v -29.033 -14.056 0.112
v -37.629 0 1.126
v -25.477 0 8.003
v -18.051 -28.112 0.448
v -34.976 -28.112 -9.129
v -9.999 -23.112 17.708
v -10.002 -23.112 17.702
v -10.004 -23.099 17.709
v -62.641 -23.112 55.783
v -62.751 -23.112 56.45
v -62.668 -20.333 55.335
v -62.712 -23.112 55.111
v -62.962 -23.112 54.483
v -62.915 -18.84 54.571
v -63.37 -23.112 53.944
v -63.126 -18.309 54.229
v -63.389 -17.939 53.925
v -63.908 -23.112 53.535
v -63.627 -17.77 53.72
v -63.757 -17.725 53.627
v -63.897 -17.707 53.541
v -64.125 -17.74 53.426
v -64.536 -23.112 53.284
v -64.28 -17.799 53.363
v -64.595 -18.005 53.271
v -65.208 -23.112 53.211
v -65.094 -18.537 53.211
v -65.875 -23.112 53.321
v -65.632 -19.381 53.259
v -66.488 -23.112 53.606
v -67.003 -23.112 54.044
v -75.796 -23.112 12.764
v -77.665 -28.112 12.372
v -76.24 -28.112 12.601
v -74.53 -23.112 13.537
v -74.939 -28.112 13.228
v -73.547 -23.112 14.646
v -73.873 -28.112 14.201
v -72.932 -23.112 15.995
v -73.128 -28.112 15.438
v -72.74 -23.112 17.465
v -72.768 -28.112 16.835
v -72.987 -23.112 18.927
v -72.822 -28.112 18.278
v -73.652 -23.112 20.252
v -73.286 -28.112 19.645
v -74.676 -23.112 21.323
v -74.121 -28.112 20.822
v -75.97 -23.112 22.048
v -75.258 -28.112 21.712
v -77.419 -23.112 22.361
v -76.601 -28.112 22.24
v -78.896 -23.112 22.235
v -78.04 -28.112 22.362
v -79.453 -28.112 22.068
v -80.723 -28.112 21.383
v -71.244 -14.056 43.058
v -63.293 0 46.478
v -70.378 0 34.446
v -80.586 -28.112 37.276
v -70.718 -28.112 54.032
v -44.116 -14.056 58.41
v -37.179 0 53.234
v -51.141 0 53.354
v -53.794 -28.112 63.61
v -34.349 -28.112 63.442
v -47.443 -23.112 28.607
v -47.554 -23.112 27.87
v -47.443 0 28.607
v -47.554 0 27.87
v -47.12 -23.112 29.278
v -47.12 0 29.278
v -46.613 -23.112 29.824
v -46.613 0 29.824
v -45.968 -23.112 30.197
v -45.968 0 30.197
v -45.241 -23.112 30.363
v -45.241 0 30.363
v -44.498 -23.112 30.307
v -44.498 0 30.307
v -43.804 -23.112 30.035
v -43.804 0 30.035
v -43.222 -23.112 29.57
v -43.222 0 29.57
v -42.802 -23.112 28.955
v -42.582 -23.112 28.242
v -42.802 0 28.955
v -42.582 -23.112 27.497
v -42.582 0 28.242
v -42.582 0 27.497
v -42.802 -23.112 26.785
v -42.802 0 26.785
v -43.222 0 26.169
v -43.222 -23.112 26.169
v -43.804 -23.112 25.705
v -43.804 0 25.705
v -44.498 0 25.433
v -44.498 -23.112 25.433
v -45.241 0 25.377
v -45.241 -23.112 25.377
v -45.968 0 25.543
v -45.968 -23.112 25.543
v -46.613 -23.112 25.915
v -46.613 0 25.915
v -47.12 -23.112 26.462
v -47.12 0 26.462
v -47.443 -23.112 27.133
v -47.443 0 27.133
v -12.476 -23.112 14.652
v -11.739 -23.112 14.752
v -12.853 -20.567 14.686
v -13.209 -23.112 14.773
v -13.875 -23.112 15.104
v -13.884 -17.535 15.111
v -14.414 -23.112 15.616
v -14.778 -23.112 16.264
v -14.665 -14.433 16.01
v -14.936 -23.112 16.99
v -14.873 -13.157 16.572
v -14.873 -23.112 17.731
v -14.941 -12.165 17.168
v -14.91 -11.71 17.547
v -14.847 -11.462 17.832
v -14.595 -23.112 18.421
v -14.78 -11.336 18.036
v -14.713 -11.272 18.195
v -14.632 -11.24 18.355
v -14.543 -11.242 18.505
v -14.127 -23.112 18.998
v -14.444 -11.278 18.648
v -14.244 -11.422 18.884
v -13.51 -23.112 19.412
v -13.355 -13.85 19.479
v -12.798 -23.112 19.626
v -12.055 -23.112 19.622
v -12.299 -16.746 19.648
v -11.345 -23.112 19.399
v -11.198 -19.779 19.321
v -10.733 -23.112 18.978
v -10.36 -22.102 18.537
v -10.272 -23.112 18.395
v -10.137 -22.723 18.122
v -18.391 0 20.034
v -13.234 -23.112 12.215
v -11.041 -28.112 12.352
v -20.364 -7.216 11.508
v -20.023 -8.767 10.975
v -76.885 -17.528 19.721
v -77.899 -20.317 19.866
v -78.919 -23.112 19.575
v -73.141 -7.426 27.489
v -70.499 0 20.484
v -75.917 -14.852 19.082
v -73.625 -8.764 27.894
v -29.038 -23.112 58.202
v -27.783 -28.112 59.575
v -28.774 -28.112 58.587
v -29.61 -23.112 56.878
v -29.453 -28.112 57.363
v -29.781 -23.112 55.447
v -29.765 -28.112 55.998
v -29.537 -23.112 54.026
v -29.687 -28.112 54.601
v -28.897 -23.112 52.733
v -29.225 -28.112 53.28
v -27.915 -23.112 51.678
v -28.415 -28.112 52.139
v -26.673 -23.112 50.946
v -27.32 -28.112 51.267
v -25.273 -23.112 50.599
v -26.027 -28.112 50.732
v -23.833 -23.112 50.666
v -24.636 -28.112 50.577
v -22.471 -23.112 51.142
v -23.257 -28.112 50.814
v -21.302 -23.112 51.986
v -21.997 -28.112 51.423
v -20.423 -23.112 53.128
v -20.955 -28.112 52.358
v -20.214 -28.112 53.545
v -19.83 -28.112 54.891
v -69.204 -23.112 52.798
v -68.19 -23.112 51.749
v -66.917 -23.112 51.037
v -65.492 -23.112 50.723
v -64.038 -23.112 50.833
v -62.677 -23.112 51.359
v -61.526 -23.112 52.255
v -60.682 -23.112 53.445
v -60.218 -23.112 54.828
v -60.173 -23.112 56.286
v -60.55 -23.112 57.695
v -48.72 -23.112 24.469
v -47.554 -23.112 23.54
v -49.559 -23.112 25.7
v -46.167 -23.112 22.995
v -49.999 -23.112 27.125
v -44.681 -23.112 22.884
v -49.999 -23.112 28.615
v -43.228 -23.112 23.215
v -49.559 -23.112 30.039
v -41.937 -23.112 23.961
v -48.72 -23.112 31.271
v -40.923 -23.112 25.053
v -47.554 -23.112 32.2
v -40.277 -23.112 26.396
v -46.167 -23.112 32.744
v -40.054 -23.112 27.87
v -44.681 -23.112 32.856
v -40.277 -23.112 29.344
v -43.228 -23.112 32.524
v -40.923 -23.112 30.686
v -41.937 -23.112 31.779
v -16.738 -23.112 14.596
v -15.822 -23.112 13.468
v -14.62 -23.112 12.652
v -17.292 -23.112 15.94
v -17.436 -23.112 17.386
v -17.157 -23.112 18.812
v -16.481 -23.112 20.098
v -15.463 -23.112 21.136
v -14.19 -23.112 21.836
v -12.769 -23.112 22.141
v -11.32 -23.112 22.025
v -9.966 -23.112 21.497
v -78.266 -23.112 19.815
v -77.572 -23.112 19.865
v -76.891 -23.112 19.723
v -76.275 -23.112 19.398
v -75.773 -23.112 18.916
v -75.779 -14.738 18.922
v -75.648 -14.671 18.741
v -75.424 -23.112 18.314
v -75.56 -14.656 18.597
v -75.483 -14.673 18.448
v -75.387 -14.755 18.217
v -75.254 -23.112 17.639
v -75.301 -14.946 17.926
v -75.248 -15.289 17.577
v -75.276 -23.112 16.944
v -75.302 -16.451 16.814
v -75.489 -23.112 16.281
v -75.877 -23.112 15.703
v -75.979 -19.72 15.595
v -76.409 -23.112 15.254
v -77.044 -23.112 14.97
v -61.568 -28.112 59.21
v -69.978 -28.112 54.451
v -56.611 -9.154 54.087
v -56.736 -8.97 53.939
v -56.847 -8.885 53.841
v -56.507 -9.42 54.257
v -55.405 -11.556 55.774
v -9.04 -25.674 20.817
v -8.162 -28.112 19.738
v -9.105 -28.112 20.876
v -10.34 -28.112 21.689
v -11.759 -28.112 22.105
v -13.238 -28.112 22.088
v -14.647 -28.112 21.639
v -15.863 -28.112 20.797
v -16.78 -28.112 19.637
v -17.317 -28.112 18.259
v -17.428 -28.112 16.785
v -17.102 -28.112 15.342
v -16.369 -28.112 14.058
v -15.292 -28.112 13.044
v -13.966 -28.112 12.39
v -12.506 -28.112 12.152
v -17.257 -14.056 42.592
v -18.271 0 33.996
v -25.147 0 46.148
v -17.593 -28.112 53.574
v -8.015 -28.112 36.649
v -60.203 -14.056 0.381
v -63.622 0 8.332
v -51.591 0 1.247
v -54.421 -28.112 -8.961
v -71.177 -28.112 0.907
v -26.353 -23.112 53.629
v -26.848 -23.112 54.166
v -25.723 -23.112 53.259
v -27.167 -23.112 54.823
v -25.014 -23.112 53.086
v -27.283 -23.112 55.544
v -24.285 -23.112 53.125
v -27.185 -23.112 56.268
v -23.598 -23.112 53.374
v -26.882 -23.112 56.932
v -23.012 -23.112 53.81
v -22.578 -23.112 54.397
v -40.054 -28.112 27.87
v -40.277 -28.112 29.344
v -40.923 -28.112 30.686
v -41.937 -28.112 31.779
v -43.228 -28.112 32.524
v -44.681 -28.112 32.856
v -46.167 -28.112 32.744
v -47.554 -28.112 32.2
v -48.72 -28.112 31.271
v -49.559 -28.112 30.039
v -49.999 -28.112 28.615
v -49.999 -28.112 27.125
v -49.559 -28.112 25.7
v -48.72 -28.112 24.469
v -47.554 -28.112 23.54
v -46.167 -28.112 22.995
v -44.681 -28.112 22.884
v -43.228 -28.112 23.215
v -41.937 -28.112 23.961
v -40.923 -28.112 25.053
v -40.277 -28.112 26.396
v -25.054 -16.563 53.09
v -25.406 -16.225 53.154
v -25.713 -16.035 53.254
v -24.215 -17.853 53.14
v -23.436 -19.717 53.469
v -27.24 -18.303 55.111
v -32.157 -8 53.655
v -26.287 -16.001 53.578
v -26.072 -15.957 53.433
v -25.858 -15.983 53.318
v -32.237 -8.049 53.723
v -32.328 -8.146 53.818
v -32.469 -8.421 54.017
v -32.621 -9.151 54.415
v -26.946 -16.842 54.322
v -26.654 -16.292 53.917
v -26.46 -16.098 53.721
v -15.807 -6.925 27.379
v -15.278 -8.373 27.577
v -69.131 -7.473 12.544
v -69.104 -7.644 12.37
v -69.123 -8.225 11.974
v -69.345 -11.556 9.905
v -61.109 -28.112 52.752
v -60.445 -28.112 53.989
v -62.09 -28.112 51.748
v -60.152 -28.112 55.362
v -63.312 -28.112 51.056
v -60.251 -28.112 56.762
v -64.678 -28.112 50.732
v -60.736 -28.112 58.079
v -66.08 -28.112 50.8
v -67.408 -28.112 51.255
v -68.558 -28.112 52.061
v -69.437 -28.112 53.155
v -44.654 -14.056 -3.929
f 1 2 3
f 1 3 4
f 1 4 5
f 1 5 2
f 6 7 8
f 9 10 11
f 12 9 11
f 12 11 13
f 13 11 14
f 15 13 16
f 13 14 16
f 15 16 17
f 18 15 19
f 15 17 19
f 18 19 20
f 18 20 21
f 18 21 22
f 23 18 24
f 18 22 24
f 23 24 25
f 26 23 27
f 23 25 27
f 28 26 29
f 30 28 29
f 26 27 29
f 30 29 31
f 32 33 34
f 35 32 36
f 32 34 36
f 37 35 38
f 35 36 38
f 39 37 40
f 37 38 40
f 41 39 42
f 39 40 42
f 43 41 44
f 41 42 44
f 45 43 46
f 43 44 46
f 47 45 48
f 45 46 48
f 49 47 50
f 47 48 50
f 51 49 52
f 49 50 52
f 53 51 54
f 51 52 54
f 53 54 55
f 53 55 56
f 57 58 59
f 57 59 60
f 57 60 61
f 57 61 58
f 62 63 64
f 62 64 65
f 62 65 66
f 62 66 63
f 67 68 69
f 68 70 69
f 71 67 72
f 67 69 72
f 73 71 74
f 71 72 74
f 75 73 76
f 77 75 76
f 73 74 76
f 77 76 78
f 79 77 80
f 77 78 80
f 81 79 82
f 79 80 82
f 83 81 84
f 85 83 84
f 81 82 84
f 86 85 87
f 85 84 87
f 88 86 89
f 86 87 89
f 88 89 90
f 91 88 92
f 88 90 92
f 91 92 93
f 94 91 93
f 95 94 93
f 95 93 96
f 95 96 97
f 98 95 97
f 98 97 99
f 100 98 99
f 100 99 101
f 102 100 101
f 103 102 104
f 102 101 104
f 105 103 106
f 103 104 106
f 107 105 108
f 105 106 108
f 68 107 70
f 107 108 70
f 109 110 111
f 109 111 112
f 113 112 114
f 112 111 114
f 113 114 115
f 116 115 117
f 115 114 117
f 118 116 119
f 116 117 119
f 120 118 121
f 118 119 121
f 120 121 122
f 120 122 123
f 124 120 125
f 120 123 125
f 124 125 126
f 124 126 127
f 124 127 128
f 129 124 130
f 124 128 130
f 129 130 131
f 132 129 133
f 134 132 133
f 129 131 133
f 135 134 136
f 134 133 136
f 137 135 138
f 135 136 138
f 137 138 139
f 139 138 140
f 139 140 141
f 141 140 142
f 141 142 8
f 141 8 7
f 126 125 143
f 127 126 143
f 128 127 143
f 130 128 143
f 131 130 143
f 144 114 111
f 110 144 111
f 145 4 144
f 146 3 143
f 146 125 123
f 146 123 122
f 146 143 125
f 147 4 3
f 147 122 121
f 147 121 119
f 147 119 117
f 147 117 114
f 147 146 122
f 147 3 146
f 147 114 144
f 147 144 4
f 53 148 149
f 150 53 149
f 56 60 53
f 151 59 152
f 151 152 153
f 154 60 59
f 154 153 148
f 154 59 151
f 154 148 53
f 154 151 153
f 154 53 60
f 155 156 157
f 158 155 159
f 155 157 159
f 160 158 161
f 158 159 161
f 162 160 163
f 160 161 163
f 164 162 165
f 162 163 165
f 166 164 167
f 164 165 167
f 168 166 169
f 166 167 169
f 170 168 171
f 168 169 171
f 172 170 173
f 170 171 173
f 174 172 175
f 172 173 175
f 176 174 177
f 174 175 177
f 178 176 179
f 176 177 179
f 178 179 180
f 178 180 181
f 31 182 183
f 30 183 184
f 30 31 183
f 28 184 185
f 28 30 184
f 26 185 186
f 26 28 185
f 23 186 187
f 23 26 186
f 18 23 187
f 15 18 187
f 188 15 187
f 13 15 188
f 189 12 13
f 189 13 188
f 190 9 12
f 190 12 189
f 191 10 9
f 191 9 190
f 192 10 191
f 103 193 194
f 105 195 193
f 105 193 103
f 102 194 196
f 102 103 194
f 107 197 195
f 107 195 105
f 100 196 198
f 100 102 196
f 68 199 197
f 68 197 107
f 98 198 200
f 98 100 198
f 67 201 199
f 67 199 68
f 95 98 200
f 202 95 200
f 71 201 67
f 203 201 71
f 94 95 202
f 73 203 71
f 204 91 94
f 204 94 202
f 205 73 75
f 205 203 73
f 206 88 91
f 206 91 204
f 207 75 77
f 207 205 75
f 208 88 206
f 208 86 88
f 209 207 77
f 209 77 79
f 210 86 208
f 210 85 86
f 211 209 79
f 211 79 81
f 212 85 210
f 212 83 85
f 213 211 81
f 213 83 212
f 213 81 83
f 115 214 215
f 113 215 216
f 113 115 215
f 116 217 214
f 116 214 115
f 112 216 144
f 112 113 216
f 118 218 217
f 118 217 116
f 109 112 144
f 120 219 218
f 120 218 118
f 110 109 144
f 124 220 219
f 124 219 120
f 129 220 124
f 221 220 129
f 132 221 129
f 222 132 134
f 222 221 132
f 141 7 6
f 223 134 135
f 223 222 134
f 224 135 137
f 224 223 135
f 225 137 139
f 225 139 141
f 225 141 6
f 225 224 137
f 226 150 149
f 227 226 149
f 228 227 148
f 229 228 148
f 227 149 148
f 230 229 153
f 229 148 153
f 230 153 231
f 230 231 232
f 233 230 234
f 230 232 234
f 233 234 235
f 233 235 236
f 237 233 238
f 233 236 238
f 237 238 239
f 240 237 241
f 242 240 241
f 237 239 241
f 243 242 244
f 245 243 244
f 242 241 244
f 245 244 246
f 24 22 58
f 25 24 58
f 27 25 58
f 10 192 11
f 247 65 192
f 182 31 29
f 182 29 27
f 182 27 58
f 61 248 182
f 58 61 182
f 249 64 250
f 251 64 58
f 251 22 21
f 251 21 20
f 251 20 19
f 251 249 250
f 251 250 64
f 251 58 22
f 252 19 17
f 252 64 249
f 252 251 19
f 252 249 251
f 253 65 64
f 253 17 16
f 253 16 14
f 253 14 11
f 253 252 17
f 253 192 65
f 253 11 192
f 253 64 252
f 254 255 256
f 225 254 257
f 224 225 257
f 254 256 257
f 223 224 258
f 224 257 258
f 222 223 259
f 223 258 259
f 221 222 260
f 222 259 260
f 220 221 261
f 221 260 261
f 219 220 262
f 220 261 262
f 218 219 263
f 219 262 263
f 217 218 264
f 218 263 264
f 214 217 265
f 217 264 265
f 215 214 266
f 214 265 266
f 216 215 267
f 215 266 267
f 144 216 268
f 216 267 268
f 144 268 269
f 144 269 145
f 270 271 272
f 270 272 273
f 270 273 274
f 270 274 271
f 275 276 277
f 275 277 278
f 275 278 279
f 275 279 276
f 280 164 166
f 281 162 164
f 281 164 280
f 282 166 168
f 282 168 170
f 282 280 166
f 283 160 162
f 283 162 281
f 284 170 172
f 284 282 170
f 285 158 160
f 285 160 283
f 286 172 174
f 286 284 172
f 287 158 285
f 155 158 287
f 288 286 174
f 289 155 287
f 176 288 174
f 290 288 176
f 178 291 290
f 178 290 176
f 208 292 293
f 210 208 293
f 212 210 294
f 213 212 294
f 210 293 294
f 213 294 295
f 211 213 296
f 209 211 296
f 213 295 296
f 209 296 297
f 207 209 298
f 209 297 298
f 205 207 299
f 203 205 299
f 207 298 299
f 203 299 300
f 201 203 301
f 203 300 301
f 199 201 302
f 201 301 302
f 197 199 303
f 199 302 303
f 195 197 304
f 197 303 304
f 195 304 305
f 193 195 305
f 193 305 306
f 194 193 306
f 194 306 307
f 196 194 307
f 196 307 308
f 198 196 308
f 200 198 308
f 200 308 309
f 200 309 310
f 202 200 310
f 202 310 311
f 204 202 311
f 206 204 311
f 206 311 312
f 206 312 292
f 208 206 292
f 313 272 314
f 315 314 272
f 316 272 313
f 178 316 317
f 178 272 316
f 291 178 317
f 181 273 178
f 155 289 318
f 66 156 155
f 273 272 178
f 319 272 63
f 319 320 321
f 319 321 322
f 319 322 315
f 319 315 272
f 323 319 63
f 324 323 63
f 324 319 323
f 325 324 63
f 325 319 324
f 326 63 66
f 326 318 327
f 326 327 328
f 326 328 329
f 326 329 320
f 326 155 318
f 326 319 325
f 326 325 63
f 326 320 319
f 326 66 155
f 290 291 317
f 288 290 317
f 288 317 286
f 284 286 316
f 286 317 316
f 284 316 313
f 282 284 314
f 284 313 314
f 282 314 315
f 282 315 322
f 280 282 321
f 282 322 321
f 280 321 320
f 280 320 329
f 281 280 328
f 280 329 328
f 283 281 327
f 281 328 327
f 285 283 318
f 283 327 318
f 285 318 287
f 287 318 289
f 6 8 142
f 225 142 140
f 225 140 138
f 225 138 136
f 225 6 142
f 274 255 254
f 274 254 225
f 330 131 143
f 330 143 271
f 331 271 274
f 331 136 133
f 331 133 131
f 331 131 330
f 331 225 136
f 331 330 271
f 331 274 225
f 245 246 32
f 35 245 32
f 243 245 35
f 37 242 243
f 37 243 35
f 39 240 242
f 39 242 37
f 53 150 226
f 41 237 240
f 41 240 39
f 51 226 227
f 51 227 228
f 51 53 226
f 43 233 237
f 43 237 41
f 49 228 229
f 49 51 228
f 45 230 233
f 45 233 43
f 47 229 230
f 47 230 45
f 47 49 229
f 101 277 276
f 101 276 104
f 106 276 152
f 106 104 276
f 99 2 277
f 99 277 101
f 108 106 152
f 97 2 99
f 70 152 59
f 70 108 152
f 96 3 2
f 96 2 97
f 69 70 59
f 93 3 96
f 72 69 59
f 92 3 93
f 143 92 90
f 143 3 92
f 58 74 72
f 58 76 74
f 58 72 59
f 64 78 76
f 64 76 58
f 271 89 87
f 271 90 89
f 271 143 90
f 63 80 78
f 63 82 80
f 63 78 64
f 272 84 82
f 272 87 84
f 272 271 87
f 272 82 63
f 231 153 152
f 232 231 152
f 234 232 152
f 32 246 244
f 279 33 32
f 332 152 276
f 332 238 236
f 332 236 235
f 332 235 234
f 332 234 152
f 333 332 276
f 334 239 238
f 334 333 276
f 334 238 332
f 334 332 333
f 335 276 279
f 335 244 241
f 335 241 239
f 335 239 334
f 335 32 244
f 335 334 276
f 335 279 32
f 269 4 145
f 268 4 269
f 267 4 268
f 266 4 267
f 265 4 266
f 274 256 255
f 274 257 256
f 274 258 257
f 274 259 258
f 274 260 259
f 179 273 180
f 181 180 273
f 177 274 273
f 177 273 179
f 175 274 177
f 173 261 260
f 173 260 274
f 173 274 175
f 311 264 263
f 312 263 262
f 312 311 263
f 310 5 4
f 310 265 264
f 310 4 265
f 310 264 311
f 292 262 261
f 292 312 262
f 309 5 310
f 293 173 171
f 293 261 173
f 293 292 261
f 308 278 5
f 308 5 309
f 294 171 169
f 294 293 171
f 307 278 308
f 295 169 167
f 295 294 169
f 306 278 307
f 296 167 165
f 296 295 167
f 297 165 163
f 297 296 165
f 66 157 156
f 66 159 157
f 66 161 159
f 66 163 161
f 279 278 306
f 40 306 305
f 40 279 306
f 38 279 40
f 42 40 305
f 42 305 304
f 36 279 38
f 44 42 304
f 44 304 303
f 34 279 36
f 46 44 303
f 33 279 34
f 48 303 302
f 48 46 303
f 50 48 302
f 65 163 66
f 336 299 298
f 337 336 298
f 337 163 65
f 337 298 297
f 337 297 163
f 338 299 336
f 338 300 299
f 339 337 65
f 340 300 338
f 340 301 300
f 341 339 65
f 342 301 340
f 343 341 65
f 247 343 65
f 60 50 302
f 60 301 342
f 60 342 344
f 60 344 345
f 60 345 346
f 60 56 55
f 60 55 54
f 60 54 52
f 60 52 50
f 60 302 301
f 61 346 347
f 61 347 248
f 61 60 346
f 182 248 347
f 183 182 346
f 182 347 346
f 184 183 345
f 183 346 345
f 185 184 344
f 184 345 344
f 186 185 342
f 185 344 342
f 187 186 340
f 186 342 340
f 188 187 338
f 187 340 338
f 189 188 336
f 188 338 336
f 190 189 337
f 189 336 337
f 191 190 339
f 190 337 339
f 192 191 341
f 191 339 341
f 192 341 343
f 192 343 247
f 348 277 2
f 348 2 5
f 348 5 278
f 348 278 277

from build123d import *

# Parameters (mm, degrees)
F1_DEPTH       = 28.1119
F1_TAPER       = -20
F3_D           = 5
F3_CBORE_D     = 10
F3_CBORE_DEPTH = 5


with BuildPart() as f1:
    # F0 (on Front) → F1 (new body)
    with BuildSketch(Plane.XZ):
        Polygon((-37.6286933092, 1.1261076269), (-25.476778123, 8.0027721288), (-18.3912431181, 20.0340958739), (-18.270651677, 33.9962953808), (-25.1473161789, 46.148210567), (-37.178639924, 53.2337455719), (-51.1408394309, 53.354337013), (-63.2927546171, 46.4776725111), (-70.378289622, 34.446348766), (-70.4988810631, 20.4841492591), (-63.6222165612, 8.3322340729), (-51.5908928161, 1.246699068), align=None)
    extrude(amount=F1_DEPTH, taper=F1_TAPER)

    # F3 (through all)
    with Locations(Plane.XZ.offset(28.1119)):
        with Locations((-77.7391013168, 17.3710930631), (-65.139479872, 55.7104988926), (-24.7830409778, 55.5750747702), (-12.4410115211, 17.1519722301), (-45.0544580817, 27.8698503971)):
            CounterBoreHole(F3_D / 2, F3_CBORE_D / 2, F3_CBORE_DEPTH)


solid = f1.part
